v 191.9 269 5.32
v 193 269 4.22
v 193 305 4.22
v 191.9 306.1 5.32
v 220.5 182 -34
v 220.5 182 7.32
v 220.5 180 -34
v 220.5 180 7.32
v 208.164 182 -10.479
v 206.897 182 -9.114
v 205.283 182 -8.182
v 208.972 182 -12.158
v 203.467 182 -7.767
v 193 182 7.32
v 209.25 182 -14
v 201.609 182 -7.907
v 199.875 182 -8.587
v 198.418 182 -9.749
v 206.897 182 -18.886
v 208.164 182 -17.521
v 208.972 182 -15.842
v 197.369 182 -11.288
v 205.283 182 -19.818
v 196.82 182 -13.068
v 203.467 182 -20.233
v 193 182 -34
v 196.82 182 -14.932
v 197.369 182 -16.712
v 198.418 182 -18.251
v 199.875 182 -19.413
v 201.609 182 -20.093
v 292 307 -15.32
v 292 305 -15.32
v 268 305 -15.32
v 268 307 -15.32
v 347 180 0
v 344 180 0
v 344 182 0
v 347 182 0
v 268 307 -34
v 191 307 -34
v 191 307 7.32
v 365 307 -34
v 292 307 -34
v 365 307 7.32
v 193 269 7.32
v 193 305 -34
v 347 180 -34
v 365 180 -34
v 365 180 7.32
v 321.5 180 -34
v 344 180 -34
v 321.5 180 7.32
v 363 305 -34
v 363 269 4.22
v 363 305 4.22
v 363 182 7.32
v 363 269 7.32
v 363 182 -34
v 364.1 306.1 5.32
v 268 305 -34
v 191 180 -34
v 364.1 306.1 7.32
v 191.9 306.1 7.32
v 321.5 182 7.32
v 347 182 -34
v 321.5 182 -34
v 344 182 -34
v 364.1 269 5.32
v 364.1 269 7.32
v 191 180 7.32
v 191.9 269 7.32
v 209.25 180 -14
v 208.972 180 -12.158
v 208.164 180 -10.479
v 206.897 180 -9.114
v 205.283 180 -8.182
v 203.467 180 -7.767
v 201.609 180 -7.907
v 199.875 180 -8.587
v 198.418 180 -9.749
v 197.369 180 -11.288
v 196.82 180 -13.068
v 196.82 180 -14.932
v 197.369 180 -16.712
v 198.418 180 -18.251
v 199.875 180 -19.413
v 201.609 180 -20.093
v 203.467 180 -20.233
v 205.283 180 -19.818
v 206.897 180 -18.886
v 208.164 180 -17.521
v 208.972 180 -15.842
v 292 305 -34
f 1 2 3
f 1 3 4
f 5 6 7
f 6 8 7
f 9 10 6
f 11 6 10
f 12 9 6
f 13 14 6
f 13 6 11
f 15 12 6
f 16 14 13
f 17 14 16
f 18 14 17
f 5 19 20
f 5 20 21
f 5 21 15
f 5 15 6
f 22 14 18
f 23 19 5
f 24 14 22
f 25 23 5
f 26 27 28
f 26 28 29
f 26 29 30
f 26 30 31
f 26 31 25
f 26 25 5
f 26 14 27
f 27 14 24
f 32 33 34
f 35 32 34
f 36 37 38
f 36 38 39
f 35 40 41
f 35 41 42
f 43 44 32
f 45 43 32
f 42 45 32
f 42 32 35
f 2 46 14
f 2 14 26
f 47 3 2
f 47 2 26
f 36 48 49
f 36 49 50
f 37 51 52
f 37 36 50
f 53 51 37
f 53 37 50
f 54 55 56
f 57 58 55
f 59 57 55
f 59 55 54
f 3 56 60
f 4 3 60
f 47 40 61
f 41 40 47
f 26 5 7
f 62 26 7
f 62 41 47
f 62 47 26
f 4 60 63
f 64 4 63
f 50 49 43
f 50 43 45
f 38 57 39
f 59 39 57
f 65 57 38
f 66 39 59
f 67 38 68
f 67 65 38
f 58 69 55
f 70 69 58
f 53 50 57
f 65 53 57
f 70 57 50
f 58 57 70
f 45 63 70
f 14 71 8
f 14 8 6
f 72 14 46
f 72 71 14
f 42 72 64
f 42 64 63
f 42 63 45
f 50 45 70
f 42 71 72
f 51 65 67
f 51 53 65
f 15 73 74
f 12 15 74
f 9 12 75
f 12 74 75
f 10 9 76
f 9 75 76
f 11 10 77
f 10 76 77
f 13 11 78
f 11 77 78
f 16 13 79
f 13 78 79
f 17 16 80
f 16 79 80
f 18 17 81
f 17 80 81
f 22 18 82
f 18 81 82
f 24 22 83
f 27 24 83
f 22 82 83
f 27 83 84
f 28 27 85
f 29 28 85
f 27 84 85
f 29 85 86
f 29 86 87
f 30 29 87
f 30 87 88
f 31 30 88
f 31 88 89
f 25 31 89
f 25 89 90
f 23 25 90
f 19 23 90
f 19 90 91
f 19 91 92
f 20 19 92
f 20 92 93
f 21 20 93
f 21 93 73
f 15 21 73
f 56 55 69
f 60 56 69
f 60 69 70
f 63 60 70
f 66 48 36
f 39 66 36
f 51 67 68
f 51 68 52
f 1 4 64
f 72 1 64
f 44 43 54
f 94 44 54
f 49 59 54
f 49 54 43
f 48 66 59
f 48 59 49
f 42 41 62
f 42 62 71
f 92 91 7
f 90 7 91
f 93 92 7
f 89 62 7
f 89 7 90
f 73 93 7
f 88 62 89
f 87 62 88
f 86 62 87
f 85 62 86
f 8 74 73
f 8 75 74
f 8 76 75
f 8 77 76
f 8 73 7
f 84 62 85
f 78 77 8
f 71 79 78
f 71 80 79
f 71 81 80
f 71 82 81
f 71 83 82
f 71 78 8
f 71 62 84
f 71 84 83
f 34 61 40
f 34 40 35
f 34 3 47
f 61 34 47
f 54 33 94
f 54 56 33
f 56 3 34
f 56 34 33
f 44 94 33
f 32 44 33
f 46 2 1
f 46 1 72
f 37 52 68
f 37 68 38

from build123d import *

# Parameters (mm, degrees)
SKETCH147_W      = 3
SKETCH147_H      = 38.397224
EXTRUDE135_DEPTH = 7
SKETCH155_W      = 172
SKETCH155_H      = 37
EXTRUDE141_DEPTH = 3
SKETCH157_W      = 24
SKETCH157_H      = 21.68
EXTRUDE143_DEPTH = 4
SKETCH135_R      = 6.25
EXTRUDE123_DEPTH = 5
SKETCH_W         = 2
SKETCH_H         = 41.32


with BuildPart() as extrude135:
    # Sketch147 → Extrude135 (new body)
    with BuildSketch(Plane(origin=(0, 177, -3), x_dir=(1, 0, 0), z_dir=(0, -1, 0))):
        with Locations((345.5, -16.198612)):
            Rectangle(SKETCH147_W, SKETCH147_H)
    extrude(amount=-EXTRUDE135_DEPTH)


with BuildPart() as clamshell001:
    # Sketch155 → Extrude141 (new body)
    with BuildSketch(Plane.XY.offset(5.32)):
        with Locations((278, 287.5)):
            Rectangle(SKETCH155_W, SKETCH155_H)
    extrude(amount=EXTRUDE141_DEPTH)


with BuildPart() as extrude143:
    # Sketch157 → Extrude143 (new body)
    with BuildSketch(Plane(origin=(0, 304, 0), x_dir=(-1, 0, 0), z_dir=(0, 1, 0))):
        with Locations((-280, -26.16)):
            Rectangle(SKETCH157_W, SKETCH157_H)
    extrude(amount=EXTRUDE143_DEPTH)


with BuildPart() as clamshell002:
    # Sweep002: sweep along a path in Sketch166
    with BuildLine(Plane.XY.offset(6)) as sweep002_path:
        Line((192, 269), (192, 306))
        Line((192, 306), (364, 306))
        Line((364, 306), (364, 269))
    # Sketch165 → Sweep002 (sweep)
    with BuildSketch(Plane.YZ.offset(230)):
        Polygon((306.1, 5.32), (304.1, 3.32), (304.1, 8.32), (306.1, 8.32), align=None)
    sweep(path=sweep002_path.line, transition=Transition.RIGHT)


with BuildPart() as compound028:
    # Sketch135 → Extrude123 (new body)
    with BuildSketch(Plane.XZ.offset(-178)):
        with Locations((203, -14)):
            Circle(SKETCH135_R)
    extrude(amount=-EXTRUDE123_DEPTH)

    # Compound028: union Extrude135, clamshell001, Extrude143, clamshell002
    add(extrude135.part)
    add(clamshell001.part)
    add(extrude143.part)
    add(clamshell002.part)


with BuildPart() as walls:
    # Sweep: sweep along a path in Sketch133
    with BuildLine(Plane(origin=(0, 0, 5.32), x_dir=(1, 0, 0), z_dir=(0, 0, -1))) as sweep_path:
        Line((220.5, -182), (193, -182))
        Line((193, -182), (193, -305))
        Line((193, -305), (363, -305))
        Line((363, -305), (363, -182))
        Line((363, -182), (321.5, -182))
    # Sketch → Sweep (sweep)
    with BuildSketch(Plane(origin=(194, 0, 0), x_dir=(0, -1, 0), z_dir=(-1, 0, 0))):
        with Locations((-181, -13.34)):
            Rectangle(SKETCH_W, SKETCH_H)
    sweep(path=sweep_path.line, transition=Transition.RIGHT)

    # Cut: cut Compound028
    add(compound028.part, mode=Mode.SUBTRACT)


solid = walls.part
